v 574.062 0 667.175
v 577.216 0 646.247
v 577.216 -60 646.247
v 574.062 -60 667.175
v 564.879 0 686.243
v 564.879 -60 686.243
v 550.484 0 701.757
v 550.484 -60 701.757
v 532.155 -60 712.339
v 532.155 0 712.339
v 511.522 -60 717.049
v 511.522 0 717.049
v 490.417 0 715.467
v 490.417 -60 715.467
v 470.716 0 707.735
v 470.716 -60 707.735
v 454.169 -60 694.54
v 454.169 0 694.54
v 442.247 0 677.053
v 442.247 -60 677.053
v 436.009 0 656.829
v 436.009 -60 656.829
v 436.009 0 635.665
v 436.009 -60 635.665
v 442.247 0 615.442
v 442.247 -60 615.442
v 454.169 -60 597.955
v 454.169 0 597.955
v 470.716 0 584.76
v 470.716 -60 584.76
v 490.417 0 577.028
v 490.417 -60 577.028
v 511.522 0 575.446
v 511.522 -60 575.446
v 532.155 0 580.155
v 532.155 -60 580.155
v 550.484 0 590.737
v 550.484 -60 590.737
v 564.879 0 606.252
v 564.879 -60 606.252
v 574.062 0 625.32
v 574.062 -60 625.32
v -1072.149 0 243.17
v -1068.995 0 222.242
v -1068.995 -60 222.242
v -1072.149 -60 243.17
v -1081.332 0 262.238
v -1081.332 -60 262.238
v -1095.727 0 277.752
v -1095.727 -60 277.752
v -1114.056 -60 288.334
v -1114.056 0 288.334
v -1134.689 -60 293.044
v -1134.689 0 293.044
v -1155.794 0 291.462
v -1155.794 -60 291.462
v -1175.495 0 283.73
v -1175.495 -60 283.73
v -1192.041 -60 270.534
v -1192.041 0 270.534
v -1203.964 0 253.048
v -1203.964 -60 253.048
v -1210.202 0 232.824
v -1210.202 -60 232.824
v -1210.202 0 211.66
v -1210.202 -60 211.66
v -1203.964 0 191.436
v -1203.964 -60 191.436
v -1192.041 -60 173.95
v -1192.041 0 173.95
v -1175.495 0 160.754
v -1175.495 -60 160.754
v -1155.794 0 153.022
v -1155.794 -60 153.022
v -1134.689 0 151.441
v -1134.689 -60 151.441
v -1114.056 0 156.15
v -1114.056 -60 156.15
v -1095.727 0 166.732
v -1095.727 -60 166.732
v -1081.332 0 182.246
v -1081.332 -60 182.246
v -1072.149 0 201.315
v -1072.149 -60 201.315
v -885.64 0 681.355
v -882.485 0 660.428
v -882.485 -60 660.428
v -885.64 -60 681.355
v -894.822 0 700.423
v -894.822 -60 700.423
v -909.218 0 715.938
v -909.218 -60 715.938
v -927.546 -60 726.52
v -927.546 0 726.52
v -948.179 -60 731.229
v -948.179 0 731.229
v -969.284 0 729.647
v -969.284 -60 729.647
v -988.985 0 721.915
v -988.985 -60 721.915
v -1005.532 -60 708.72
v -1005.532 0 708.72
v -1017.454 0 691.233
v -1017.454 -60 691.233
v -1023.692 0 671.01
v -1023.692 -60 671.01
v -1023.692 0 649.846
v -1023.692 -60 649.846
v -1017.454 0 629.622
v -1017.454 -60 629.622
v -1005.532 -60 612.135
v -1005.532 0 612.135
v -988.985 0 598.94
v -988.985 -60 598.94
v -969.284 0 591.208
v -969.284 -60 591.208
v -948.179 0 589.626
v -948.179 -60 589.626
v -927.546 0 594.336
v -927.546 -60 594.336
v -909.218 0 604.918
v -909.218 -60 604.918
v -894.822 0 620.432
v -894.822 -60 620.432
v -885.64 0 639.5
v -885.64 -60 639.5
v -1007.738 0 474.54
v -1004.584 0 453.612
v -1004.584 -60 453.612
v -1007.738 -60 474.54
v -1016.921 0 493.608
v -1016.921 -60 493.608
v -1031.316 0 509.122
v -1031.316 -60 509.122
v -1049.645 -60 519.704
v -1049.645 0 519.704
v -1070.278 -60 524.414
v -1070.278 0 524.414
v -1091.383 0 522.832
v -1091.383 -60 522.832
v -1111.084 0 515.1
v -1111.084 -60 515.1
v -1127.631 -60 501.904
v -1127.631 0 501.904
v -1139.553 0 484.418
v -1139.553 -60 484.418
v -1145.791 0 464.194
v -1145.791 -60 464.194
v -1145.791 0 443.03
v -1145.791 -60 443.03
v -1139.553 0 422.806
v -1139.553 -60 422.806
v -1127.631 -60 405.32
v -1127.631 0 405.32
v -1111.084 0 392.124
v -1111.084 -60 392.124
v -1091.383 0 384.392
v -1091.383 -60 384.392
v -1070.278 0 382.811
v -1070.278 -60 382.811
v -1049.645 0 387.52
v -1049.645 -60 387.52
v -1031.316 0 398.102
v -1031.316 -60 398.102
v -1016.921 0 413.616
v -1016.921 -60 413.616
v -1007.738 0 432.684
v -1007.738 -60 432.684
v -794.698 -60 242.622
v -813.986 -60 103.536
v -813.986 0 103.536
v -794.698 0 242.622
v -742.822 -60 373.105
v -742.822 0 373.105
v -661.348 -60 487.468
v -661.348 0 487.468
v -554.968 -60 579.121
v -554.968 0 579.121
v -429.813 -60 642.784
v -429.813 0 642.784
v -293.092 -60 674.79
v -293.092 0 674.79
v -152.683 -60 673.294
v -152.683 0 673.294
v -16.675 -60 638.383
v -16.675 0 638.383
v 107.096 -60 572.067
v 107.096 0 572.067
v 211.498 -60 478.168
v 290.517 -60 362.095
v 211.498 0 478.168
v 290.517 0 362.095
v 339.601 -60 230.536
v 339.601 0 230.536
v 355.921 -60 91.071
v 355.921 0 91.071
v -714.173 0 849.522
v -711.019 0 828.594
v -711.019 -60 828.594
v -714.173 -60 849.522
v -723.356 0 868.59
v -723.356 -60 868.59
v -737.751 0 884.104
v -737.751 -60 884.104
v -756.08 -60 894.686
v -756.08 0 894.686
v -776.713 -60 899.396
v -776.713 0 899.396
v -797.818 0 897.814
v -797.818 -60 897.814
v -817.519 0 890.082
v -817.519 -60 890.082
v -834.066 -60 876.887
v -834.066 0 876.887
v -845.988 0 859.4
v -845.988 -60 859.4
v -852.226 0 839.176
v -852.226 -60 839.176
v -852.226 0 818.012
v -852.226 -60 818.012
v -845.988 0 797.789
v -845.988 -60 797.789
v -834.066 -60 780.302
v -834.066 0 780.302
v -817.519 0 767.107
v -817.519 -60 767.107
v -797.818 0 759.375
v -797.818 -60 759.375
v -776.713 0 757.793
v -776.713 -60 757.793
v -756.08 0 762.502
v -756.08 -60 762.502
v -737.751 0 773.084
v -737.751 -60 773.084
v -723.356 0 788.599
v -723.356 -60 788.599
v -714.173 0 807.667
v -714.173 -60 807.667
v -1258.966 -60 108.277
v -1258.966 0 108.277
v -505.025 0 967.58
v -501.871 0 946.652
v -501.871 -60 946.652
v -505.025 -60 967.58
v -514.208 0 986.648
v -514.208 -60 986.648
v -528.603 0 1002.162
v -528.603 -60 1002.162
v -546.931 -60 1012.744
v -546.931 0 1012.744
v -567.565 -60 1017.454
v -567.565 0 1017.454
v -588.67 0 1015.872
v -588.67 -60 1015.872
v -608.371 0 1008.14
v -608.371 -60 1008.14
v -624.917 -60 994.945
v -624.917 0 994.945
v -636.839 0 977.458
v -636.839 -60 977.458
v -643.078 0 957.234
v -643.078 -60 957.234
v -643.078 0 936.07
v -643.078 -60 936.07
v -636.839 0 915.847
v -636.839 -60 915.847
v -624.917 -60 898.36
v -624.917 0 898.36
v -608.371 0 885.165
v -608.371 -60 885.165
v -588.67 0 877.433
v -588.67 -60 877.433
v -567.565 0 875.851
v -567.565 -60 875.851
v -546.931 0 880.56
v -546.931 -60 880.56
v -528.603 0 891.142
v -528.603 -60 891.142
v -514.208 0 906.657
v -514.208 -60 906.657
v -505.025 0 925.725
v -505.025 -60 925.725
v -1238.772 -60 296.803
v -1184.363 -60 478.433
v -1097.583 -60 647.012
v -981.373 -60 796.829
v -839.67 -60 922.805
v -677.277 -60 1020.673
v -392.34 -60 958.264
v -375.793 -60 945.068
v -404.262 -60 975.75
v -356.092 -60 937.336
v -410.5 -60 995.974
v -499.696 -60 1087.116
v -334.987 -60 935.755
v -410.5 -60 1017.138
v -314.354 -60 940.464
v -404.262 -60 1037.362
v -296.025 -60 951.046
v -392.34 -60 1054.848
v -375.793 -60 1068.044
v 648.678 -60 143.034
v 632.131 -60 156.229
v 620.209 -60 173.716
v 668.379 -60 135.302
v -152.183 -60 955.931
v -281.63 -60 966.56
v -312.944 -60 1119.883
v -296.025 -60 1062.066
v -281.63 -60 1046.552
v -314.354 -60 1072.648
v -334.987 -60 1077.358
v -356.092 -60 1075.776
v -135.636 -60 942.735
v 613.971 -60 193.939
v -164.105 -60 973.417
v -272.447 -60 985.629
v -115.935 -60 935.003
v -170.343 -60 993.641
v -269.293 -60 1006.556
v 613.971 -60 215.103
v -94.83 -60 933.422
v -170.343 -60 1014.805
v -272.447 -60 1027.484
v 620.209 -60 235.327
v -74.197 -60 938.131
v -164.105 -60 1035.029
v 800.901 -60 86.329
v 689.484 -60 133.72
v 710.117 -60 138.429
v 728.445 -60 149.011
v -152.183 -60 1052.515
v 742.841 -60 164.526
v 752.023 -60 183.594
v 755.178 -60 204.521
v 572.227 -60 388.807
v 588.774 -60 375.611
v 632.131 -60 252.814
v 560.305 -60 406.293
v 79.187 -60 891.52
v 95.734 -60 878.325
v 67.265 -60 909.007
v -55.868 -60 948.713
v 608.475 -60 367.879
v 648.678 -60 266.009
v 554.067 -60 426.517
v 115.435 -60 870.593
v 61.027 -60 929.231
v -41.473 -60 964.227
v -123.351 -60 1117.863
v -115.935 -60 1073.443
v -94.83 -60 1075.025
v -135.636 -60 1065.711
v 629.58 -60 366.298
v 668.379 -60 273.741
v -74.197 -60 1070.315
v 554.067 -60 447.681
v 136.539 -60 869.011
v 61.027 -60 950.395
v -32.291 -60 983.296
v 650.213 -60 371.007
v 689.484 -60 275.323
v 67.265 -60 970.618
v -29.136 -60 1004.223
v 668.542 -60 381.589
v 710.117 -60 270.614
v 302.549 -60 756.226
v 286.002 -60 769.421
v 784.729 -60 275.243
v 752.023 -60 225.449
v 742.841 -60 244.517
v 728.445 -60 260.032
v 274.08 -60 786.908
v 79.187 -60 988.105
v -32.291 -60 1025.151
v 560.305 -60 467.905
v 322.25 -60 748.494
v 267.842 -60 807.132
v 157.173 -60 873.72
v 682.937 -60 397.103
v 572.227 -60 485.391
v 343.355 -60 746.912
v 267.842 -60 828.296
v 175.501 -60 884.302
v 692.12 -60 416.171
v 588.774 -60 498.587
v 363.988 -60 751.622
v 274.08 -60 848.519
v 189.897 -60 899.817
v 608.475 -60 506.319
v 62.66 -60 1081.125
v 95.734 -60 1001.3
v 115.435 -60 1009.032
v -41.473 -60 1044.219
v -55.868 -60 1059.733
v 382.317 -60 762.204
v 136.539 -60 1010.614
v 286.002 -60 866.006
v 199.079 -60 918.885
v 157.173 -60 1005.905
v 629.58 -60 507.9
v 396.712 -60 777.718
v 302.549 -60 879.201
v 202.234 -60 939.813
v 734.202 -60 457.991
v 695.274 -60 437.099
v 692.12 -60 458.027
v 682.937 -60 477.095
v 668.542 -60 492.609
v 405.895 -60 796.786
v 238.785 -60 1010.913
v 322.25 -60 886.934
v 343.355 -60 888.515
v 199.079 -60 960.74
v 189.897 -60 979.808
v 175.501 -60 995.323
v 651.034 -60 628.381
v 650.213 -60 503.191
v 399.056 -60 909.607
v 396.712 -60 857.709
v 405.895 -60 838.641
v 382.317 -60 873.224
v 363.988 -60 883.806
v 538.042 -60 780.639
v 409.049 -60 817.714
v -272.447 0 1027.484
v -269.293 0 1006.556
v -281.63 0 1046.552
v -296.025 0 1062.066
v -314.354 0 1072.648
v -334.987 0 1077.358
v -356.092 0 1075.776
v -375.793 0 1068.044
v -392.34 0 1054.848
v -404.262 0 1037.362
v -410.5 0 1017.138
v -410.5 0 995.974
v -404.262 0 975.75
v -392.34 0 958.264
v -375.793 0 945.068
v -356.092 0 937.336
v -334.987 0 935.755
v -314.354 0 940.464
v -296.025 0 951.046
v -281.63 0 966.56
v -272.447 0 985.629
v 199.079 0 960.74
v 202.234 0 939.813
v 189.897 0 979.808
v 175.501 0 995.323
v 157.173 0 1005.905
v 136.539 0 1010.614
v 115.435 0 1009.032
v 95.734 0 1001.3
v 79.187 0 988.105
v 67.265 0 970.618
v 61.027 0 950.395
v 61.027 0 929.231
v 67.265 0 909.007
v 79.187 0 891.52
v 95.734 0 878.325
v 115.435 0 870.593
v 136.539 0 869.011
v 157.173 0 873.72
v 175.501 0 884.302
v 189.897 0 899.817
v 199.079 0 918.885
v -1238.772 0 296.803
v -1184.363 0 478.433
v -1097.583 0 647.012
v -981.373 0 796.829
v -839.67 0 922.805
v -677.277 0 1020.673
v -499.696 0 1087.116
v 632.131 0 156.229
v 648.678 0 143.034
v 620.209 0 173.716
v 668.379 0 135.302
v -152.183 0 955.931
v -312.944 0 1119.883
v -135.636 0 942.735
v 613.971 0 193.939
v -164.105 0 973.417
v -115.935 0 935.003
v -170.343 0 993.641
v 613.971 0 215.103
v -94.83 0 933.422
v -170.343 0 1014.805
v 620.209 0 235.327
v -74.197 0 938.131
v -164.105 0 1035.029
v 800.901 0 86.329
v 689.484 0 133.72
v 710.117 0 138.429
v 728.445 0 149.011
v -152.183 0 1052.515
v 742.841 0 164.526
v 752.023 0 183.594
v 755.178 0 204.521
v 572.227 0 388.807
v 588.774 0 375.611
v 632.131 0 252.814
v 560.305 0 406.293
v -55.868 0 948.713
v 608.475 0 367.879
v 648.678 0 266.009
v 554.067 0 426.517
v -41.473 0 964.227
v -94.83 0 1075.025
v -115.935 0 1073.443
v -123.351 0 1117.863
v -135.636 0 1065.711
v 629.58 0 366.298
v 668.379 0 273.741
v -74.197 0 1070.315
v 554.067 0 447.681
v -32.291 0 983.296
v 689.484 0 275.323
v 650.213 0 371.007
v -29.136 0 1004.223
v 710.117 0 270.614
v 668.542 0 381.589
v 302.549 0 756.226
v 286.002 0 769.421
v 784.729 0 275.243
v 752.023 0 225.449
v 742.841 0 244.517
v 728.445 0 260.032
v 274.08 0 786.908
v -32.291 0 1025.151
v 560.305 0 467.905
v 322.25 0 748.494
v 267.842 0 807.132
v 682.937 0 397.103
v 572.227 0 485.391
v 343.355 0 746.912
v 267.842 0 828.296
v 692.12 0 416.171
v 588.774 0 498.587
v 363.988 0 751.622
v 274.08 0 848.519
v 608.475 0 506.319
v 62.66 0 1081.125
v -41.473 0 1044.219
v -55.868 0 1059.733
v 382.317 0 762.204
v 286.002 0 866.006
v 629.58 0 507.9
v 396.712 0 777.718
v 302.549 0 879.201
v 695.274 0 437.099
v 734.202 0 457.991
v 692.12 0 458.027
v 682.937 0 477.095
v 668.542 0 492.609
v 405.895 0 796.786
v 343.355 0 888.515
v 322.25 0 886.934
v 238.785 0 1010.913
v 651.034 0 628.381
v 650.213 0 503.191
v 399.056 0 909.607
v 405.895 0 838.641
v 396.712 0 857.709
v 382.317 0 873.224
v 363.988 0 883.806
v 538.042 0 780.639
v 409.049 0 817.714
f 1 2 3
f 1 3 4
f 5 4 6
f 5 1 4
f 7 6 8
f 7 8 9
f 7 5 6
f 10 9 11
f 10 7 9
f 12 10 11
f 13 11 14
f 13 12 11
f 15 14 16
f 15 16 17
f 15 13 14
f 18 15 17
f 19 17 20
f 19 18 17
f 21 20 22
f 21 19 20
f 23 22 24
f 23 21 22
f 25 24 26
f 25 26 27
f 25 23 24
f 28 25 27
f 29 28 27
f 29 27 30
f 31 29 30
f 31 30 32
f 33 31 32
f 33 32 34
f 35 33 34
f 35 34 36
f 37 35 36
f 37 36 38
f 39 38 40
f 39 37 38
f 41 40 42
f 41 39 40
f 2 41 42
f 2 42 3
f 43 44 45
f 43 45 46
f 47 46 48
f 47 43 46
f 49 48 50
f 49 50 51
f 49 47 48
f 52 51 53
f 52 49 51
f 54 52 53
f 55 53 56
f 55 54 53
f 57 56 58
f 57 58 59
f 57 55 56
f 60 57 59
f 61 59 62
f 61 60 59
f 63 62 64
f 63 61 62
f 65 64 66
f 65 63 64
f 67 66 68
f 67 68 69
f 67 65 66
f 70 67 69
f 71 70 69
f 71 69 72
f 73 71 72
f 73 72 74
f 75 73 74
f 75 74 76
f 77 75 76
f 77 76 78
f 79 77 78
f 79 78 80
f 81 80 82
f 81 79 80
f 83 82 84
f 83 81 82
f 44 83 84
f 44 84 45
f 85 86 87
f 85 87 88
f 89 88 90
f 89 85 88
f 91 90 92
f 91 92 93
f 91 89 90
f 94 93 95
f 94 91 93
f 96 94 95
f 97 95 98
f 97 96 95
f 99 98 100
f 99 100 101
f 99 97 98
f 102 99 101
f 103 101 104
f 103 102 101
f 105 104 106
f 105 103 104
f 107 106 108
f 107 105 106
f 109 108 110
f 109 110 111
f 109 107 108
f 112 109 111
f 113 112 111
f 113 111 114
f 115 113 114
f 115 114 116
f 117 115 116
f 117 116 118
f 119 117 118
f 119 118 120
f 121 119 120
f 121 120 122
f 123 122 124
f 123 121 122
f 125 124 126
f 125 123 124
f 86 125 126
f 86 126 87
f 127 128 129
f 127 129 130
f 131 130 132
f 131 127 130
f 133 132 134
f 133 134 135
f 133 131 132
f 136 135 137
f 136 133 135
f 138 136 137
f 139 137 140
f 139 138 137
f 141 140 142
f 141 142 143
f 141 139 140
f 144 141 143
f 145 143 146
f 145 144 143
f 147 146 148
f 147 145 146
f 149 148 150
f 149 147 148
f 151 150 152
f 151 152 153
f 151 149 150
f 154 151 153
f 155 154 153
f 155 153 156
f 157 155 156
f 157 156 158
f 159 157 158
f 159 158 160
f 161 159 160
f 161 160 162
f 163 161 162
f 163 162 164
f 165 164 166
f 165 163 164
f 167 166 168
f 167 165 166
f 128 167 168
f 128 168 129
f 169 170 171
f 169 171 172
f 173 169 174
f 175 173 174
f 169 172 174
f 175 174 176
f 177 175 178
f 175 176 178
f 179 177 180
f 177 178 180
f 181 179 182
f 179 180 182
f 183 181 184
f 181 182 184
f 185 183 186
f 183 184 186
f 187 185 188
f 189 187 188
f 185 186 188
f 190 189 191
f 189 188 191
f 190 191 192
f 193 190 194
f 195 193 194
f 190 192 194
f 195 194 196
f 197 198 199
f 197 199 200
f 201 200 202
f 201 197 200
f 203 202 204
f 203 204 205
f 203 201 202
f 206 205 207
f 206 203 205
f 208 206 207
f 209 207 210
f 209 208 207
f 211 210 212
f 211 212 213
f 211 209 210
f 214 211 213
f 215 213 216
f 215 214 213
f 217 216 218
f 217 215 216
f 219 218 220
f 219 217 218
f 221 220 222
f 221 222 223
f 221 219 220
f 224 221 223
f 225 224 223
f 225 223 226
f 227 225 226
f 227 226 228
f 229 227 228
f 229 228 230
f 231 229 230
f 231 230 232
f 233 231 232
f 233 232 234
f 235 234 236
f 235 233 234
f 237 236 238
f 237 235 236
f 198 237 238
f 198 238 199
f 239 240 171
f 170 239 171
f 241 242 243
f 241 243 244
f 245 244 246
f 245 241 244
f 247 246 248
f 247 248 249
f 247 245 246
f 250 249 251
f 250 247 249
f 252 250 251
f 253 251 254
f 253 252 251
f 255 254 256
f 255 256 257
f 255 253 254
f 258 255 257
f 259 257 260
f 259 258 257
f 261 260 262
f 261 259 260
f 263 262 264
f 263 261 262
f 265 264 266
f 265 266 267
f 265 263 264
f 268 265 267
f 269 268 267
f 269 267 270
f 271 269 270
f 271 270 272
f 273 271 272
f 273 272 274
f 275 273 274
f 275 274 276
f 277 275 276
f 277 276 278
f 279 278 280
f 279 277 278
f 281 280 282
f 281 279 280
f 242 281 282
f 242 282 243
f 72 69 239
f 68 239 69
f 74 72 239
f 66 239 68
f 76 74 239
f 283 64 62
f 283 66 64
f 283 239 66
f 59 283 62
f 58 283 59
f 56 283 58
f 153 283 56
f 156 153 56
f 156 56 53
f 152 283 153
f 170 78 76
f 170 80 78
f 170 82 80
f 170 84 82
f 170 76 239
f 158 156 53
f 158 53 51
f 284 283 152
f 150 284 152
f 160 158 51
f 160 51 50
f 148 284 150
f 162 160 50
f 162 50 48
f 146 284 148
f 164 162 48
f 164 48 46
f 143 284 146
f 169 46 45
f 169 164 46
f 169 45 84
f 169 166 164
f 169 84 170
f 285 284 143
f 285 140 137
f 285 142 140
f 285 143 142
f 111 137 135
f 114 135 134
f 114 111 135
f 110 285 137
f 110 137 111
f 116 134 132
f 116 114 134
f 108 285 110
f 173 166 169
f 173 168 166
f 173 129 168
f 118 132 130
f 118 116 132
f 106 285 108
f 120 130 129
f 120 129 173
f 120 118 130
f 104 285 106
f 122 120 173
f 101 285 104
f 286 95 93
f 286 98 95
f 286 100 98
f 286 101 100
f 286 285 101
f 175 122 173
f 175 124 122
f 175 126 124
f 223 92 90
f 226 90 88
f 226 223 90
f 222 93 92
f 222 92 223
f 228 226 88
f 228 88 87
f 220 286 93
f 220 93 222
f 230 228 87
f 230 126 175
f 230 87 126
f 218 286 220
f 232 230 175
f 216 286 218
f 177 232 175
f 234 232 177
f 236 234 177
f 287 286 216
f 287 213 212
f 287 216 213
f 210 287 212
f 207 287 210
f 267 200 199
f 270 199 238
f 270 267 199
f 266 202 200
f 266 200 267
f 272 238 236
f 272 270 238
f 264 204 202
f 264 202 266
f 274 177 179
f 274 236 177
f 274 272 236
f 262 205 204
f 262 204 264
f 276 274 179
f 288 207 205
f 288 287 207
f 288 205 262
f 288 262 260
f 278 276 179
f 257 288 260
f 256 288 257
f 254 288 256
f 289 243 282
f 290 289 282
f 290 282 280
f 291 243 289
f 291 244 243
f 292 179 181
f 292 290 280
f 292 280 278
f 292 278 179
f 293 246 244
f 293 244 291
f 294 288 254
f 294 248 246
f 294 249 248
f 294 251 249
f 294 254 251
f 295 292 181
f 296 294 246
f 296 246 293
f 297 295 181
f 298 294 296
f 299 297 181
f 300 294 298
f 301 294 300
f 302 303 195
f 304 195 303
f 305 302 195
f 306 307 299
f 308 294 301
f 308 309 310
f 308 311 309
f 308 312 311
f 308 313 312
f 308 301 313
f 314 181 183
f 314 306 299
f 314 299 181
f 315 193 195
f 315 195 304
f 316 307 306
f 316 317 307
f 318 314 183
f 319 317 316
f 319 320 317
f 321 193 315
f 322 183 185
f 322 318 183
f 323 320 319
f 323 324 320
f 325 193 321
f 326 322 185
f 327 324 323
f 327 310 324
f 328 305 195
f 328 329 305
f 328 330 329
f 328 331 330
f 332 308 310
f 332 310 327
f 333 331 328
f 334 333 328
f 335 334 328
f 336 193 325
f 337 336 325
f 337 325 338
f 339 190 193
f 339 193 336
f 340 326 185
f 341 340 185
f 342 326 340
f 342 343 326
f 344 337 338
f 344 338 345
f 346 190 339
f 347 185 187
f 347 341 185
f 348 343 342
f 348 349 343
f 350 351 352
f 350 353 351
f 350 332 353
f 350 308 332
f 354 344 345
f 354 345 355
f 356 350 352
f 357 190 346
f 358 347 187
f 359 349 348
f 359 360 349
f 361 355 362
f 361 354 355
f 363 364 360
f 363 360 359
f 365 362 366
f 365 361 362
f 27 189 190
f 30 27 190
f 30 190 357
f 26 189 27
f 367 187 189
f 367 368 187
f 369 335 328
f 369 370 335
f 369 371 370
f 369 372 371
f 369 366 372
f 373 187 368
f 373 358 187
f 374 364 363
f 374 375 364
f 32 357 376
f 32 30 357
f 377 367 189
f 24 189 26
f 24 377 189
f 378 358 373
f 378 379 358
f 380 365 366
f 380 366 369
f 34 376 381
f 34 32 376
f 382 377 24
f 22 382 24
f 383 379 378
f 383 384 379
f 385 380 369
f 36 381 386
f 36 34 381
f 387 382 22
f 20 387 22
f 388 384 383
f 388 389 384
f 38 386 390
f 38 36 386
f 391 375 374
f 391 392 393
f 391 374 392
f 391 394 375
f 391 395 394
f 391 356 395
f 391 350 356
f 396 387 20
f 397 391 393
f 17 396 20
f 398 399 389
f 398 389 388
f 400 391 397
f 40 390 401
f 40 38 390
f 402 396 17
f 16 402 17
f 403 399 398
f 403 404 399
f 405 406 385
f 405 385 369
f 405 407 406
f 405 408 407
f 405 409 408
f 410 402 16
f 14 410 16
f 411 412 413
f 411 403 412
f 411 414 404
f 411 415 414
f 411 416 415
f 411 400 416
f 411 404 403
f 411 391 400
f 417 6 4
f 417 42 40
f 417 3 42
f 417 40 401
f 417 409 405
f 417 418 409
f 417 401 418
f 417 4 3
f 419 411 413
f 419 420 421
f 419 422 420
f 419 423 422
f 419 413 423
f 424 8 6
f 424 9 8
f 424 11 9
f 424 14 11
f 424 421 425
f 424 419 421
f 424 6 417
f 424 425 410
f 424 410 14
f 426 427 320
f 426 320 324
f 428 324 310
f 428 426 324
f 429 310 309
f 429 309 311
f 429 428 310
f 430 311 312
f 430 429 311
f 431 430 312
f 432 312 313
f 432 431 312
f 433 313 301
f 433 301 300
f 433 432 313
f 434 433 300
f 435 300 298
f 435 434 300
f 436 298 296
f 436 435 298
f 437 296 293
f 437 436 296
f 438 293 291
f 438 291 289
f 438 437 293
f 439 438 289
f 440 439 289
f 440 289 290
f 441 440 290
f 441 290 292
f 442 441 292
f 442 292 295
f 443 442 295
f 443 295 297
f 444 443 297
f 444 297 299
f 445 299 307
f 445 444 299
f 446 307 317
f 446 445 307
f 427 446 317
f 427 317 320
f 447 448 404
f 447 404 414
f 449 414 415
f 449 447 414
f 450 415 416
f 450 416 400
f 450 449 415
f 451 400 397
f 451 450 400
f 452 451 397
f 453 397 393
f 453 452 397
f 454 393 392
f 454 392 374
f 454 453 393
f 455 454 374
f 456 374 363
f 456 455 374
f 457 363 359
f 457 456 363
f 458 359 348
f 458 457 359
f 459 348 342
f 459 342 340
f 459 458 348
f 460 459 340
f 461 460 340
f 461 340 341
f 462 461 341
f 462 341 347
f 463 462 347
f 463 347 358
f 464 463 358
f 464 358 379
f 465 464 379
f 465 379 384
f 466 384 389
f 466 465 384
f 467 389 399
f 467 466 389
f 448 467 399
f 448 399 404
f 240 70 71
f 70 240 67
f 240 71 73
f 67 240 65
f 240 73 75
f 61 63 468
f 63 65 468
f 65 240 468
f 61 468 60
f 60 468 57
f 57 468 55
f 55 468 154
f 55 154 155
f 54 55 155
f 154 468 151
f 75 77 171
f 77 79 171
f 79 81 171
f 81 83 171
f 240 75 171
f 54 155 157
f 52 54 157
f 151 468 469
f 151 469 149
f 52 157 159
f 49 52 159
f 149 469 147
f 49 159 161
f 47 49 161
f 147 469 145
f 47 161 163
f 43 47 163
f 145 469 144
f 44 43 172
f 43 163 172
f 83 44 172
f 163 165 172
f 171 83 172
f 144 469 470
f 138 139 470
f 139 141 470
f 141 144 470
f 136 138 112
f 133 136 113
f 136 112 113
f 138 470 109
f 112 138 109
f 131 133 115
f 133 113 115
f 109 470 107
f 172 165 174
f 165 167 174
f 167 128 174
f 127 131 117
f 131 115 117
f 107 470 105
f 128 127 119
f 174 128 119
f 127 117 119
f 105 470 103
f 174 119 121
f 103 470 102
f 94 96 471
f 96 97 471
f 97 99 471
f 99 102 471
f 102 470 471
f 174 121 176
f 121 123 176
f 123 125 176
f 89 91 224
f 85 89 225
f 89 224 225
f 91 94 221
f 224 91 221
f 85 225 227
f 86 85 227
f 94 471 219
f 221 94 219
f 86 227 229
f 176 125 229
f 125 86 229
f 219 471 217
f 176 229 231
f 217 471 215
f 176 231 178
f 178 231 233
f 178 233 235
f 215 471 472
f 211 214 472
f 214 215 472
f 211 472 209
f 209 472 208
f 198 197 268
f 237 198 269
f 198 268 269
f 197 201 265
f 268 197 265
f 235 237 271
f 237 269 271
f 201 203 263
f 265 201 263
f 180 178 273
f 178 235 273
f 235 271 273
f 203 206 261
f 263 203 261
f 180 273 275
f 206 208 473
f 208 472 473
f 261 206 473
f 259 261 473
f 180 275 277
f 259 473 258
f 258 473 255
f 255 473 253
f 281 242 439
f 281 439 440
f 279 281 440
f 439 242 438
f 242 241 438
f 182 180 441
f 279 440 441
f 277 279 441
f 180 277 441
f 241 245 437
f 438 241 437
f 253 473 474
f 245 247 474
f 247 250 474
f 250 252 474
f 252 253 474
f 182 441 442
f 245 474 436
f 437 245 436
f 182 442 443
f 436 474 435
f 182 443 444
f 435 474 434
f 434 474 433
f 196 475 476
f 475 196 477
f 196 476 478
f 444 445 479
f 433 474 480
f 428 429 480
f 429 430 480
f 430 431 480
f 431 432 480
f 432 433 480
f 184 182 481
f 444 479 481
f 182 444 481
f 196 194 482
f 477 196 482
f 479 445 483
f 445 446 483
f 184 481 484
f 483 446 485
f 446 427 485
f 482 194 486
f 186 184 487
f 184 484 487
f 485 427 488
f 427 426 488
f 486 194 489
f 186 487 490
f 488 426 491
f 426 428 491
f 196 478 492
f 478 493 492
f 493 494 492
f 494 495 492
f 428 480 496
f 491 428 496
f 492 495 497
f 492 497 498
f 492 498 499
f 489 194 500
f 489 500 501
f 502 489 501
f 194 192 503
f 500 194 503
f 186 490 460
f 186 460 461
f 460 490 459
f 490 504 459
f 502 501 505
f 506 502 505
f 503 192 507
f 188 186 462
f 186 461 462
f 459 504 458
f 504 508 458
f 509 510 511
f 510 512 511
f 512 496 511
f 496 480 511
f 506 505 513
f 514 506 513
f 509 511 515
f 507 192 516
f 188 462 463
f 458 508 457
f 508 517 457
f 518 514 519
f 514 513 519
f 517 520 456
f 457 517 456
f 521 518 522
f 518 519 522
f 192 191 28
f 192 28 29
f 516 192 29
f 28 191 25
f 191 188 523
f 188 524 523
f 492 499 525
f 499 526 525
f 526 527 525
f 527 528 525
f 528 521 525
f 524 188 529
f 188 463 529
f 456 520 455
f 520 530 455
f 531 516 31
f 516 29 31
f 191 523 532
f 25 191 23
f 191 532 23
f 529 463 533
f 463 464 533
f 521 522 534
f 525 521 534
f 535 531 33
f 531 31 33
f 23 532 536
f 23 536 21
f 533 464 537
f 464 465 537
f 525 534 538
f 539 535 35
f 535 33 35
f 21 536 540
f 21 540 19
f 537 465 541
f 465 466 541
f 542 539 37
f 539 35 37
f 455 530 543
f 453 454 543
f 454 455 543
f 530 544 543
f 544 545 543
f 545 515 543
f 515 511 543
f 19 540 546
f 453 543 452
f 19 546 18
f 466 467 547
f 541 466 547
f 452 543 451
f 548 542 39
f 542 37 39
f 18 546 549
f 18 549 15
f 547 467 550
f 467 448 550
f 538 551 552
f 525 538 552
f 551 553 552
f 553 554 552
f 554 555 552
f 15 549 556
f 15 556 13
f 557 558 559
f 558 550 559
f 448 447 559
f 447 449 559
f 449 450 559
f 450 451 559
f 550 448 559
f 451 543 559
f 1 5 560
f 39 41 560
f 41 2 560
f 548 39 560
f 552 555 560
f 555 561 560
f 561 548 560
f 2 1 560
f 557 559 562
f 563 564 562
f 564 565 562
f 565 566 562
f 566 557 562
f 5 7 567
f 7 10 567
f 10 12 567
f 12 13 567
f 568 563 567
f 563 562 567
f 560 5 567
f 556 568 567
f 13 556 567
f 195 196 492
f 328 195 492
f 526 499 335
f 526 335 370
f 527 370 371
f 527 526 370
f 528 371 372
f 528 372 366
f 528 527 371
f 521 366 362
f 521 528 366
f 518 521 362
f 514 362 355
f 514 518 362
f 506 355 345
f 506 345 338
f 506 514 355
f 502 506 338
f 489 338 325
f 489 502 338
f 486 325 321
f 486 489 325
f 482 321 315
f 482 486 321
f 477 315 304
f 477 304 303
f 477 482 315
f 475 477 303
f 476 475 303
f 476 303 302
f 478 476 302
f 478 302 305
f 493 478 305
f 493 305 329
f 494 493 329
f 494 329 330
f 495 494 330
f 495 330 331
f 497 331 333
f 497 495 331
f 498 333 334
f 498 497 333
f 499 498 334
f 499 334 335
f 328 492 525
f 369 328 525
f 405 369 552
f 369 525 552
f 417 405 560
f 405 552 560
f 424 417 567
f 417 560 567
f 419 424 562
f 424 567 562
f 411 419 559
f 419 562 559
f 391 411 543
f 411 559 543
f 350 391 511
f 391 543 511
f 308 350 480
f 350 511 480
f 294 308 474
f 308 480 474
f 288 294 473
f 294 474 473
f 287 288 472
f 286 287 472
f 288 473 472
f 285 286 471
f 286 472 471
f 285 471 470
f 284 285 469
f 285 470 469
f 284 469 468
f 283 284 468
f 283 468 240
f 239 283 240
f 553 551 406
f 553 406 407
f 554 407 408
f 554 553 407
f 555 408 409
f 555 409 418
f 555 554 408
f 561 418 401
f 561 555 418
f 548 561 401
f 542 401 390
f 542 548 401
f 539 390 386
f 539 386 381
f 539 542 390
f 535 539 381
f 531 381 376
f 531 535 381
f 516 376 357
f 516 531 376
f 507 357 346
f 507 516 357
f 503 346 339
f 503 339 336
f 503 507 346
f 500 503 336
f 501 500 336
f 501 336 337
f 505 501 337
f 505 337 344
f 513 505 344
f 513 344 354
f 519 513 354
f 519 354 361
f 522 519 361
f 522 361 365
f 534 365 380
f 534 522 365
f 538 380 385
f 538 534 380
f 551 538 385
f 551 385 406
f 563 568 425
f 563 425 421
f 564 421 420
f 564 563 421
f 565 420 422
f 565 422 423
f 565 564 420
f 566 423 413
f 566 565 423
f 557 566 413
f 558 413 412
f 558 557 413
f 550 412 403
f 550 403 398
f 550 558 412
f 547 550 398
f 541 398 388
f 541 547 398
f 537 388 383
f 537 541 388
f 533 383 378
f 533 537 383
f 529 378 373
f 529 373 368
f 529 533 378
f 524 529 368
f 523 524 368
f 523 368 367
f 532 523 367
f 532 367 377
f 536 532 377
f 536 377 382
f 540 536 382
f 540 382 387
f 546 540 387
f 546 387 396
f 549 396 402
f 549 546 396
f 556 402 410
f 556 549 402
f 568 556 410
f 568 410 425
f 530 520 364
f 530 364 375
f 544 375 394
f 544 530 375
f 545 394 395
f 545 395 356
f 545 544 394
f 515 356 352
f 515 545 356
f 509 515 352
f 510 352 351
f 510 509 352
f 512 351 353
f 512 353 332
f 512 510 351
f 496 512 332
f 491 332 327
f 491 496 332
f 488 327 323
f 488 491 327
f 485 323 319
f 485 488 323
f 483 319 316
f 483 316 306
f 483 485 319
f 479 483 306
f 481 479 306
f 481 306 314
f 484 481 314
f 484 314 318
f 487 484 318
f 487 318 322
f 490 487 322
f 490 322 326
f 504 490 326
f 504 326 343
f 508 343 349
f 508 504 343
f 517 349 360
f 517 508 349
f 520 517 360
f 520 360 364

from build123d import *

# Parameters (mm, degrees)
F0_R     = 71
F1_DEPTH = 60


with BuildPart() as f1:
    # F0 (on Front) → F1 (new body)
    with BuildSketch(Plane.XZ):
        with BuildLine():
            ThreePointArc((-813.985563, 103.535805), (-222.842293, 678.27021), (355.920681, 91.070567))
            Line((355.920681, 91.070567), (800.901331, 86.329341))
            ThreePointArc((800.901331, 86.329341), (-218.10113, 1123.244952), (-1258.966213, 108.277031))
            Line((-1258.966213, 108.277031), (-813.985563, 103.535805))
        make_face()
        with Locations((-1139.994805, 222.242215)):
            Circle(F0_R, mode=Mode.SUBTRACT)
        with Locations((-1075.58415, 453.612111)):
            Circle(F0_R, mode=Mode.SUBTRACT)
        with Locations((684.177669, 204.521474)):
            Circle(F0_R, mode=Mode.SUBTRACT)
        with Locations((624.273984, 437.099009)):
            Circle(F0_R, mode=Mode.SUBTRACT)
        with Locations((-953.485299, 660.427565)):
            Circle(F0_R, mode=Mode.SUBTRACT)
        with Locations((-782.019088, 828.594444)):
            Circle(F0_R, mode=Mode.SUBTRACT)
        with Locations((-572.870654, 946.652456)):
            Circle(F0_R, mode=Mode.SUBTRACT)
        with Locations((-340.293119, 1006.55614)):
            Circle(F0_R, mode=Mode.SUBTRACT)
        with Locations((506.215973, 646.247443)):
            Circle(F0_R, mode=Mode.SUBTRACT)
        with Locations((338.049093, 817.713654)):
            Circle(F0_R, mode=Mode.SUBTRACT)
        with Locations((131.233639, 939.812505)):
            Circle(F0_R, mode=Mode.SUBTRACT)
        with Locations((-100.136257, 1004.22316)):
            Circle(F0_R, mode=Mode.SUBTRACT)
    extrude(amount=F1_DEPTH)


solid = f1.part
